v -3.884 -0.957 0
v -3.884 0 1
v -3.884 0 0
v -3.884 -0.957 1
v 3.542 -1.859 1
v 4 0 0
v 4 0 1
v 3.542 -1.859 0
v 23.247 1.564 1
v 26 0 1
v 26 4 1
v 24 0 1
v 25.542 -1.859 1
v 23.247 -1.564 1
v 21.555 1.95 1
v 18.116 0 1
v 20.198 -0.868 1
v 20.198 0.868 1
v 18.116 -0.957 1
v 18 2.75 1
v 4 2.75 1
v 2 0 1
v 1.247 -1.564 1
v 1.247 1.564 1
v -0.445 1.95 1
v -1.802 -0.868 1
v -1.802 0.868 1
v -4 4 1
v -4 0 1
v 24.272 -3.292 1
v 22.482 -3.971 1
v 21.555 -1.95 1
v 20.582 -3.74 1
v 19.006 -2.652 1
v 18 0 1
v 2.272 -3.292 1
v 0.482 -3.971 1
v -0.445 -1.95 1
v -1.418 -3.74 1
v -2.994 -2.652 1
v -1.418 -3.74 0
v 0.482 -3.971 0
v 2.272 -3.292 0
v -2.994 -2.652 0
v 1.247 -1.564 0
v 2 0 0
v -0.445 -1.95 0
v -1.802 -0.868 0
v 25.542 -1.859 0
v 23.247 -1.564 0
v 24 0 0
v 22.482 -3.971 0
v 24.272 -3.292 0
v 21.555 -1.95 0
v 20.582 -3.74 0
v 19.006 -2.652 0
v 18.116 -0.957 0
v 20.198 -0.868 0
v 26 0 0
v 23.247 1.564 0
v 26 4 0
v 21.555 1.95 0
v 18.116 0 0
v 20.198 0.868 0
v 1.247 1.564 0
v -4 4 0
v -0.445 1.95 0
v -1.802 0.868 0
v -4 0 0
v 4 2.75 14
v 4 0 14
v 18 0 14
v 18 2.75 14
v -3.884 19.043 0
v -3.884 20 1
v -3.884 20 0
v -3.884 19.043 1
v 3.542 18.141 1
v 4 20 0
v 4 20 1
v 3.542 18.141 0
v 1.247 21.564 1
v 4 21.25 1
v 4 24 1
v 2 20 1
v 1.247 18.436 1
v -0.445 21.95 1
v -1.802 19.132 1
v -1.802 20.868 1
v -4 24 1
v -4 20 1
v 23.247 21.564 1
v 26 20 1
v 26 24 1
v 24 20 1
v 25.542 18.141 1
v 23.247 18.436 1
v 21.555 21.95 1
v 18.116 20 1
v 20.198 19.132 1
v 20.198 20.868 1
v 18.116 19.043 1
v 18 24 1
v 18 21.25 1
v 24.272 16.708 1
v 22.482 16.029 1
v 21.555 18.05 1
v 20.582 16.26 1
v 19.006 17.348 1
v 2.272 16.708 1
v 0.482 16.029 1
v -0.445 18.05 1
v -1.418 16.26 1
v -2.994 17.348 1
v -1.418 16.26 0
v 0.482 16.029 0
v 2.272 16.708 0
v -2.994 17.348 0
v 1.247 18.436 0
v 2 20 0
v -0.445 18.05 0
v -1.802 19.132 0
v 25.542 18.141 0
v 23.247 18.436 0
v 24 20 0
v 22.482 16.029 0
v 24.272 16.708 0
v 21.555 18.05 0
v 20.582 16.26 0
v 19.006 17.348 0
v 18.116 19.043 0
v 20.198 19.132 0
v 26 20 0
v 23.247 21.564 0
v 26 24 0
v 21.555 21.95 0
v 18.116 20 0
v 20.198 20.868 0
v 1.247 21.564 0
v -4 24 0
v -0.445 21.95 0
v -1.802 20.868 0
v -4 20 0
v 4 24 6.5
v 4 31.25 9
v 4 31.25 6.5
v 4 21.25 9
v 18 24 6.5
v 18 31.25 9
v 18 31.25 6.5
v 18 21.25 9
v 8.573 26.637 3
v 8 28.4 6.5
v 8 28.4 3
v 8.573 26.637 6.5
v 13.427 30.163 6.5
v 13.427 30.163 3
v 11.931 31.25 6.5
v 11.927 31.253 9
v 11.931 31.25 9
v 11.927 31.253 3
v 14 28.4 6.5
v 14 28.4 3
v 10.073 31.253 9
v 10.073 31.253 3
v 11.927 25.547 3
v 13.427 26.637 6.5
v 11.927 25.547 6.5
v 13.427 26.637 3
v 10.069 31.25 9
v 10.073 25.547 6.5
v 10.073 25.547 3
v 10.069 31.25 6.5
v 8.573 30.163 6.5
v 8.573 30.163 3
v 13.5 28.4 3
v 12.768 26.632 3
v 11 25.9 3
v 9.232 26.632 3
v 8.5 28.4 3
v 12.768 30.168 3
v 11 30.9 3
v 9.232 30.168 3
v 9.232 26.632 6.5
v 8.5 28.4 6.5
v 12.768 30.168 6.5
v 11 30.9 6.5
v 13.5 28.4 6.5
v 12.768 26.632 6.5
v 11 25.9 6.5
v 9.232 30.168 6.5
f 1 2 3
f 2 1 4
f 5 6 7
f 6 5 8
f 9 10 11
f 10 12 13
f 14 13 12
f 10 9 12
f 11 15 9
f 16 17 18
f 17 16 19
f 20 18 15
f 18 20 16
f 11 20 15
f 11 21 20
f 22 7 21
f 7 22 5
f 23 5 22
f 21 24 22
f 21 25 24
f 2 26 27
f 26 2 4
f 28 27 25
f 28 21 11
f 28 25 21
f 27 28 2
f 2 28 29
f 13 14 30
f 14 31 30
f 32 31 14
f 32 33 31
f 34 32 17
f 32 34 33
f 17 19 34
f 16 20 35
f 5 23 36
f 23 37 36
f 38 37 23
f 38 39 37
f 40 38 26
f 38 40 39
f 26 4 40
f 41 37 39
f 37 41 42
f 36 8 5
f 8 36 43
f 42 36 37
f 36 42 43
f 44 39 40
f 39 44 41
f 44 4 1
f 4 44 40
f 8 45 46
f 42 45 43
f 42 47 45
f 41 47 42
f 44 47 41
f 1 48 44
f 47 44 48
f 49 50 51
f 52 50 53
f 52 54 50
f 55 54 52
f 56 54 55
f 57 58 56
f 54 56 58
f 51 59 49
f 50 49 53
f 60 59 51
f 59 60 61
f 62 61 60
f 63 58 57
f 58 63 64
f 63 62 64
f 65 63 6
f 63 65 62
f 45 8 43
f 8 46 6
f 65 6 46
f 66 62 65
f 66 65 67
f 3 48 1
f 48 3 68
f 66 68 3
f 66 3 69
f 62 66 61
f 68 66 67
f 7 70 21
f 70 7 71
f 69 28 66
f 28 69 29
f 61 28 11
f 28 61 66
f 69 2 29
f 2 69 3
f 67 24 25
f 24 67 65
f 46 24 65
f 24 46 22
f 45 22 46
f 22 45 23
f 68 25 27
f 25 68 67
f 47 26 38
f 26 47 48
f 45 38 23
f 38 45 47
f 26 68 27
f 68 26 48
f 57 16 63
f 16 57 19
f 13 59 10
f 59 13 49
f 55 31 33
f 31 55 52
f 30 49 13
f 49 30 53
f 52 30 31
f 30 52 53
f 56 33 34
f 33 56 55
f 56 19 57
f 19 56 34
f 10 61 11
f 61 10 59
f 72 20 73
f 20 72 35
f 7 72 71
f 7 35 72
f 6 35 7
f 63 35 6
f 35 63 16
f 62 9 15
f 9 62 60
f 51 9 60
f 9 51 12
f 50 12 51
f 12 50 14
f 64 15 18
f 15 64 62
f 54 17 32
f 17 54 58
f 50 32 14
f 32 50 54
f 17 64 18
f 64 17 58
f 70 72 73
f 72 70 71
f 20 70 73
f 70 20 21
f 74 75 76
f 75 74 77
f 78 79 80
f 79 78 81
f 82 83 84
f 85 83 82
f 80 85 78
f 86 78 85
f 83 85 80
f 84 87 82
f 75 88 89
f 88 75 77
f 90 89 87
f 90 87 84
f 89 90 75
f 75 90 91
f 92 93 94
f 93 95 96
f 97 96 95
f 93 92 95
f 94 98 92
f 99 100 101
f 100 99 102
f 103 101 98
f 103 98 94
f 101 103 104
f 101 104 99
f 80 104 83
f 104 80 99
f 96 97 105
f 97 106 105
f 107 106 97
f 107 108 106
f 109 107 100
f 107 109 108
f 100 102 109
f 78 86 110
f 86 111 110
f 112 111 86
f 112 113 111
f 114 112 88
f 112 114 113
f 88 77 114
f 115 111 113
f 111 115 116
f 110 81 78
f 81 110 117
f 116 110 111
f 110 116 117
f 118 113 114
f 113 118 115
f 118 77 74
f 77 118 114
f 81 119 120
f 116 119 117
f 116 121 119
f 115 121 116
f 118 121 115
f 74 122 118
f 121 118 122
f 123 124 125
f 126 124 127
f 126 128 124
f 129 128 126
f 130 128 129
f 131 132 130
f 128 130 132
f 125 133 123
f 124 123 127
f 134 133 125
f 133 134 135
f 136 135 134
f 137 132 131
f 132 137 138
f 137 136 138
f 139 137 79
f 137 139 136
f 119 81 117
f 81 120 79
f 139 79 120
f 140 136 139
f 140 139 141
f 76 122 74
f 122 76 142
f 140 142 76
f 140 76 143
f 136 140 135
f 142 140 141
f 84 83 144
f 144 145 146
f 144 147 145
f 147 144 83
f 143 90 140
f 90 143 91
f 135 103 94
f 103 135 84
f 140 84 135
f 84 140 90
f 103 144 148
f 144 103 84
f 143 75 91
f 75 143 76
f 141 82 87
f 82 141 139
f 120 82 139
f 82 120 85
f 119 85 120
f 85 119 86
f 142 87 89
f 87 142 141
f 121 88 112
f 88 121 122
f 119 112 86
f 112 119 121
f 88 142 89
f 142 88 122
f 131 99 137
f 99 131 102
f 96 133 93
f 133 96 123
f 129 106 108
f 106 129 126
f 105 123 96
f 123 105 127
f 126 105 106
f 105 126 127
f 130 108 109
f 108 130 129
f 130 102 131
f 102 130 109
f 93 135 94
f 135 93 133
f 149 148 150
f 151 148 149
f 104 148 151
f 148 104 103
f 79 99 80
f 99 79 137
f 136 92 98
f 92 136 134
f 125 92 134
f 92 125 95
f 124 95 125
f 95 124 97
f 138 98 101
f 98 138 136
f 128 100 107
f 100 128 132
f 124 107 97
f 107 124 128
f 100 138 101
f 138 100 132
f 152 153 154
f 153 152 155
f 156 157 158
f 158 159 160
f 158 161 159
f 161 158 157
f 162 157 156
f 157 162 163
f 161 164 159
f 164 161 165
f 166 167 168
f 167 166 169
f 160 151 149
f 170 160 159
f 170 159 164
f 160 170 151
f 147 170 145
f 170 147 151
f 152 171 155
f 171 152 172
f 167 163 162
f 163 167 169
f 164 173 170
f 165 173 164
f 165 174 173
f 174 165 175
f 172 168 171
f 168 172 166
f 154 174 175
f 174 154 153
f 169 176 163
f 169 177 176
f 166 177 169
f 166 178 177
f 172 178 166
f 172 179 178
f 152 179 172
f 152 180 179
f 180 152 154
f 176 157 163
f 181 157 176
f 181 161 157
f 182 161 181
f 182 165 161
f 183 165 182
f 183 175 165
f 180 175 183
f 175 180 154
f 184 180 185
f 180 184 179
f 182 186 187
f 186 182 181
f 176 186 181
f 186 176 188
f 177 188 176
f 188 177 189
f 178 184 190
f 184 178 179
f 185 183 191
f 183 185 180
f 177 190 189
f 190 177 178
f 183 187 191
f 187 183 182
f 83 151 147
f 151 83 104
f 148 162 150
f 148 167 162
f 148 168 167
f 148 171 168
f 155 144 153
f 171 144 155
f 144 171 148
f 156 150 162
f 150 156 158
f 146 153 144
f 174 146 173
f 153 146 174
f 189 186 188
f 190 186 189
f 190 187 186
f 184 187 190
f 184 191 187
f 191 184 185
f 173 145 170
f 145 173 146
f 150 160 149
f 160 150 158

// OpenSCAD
module raisedScrewHole(height) {
    difference() {
        union() {
            cylinder(height, r=4);
            translate([-4, 0, 0]) cube([8, 4, height], false);
        }
        
        // translate([0, 0, 1]) cylinder(2, r=3);
        cylinder(height, r=2);
    }
}

union() {
    raisedScrewHole(1);
    translate([22, 0, 0]) raisedScrewHole(1);
    translate([4, 0, 0]) cube([14, 4, 1], false);
    translate([4, 0, 0]) cube([14, 2.75, 14], false);
}

translate([0, 20, 0]) union() {
    raisedScrewHole(1);
    translate([22, 0, 0]) raisedScrewHole(1);
    translate([4, 0, 0]) cube([14, 4, 1], false);
    translate([4, 1.25, 0]) cube([14, 2.75, 9], false);

    translate([4, 1.25, 6.5]) cube([14, 10, 2.5], false);
    translate([11, 8.4, 3]) difference() {
        cylinder(r=3, h=6);
        cylinder(r=2.5, h=6);
    }
}
